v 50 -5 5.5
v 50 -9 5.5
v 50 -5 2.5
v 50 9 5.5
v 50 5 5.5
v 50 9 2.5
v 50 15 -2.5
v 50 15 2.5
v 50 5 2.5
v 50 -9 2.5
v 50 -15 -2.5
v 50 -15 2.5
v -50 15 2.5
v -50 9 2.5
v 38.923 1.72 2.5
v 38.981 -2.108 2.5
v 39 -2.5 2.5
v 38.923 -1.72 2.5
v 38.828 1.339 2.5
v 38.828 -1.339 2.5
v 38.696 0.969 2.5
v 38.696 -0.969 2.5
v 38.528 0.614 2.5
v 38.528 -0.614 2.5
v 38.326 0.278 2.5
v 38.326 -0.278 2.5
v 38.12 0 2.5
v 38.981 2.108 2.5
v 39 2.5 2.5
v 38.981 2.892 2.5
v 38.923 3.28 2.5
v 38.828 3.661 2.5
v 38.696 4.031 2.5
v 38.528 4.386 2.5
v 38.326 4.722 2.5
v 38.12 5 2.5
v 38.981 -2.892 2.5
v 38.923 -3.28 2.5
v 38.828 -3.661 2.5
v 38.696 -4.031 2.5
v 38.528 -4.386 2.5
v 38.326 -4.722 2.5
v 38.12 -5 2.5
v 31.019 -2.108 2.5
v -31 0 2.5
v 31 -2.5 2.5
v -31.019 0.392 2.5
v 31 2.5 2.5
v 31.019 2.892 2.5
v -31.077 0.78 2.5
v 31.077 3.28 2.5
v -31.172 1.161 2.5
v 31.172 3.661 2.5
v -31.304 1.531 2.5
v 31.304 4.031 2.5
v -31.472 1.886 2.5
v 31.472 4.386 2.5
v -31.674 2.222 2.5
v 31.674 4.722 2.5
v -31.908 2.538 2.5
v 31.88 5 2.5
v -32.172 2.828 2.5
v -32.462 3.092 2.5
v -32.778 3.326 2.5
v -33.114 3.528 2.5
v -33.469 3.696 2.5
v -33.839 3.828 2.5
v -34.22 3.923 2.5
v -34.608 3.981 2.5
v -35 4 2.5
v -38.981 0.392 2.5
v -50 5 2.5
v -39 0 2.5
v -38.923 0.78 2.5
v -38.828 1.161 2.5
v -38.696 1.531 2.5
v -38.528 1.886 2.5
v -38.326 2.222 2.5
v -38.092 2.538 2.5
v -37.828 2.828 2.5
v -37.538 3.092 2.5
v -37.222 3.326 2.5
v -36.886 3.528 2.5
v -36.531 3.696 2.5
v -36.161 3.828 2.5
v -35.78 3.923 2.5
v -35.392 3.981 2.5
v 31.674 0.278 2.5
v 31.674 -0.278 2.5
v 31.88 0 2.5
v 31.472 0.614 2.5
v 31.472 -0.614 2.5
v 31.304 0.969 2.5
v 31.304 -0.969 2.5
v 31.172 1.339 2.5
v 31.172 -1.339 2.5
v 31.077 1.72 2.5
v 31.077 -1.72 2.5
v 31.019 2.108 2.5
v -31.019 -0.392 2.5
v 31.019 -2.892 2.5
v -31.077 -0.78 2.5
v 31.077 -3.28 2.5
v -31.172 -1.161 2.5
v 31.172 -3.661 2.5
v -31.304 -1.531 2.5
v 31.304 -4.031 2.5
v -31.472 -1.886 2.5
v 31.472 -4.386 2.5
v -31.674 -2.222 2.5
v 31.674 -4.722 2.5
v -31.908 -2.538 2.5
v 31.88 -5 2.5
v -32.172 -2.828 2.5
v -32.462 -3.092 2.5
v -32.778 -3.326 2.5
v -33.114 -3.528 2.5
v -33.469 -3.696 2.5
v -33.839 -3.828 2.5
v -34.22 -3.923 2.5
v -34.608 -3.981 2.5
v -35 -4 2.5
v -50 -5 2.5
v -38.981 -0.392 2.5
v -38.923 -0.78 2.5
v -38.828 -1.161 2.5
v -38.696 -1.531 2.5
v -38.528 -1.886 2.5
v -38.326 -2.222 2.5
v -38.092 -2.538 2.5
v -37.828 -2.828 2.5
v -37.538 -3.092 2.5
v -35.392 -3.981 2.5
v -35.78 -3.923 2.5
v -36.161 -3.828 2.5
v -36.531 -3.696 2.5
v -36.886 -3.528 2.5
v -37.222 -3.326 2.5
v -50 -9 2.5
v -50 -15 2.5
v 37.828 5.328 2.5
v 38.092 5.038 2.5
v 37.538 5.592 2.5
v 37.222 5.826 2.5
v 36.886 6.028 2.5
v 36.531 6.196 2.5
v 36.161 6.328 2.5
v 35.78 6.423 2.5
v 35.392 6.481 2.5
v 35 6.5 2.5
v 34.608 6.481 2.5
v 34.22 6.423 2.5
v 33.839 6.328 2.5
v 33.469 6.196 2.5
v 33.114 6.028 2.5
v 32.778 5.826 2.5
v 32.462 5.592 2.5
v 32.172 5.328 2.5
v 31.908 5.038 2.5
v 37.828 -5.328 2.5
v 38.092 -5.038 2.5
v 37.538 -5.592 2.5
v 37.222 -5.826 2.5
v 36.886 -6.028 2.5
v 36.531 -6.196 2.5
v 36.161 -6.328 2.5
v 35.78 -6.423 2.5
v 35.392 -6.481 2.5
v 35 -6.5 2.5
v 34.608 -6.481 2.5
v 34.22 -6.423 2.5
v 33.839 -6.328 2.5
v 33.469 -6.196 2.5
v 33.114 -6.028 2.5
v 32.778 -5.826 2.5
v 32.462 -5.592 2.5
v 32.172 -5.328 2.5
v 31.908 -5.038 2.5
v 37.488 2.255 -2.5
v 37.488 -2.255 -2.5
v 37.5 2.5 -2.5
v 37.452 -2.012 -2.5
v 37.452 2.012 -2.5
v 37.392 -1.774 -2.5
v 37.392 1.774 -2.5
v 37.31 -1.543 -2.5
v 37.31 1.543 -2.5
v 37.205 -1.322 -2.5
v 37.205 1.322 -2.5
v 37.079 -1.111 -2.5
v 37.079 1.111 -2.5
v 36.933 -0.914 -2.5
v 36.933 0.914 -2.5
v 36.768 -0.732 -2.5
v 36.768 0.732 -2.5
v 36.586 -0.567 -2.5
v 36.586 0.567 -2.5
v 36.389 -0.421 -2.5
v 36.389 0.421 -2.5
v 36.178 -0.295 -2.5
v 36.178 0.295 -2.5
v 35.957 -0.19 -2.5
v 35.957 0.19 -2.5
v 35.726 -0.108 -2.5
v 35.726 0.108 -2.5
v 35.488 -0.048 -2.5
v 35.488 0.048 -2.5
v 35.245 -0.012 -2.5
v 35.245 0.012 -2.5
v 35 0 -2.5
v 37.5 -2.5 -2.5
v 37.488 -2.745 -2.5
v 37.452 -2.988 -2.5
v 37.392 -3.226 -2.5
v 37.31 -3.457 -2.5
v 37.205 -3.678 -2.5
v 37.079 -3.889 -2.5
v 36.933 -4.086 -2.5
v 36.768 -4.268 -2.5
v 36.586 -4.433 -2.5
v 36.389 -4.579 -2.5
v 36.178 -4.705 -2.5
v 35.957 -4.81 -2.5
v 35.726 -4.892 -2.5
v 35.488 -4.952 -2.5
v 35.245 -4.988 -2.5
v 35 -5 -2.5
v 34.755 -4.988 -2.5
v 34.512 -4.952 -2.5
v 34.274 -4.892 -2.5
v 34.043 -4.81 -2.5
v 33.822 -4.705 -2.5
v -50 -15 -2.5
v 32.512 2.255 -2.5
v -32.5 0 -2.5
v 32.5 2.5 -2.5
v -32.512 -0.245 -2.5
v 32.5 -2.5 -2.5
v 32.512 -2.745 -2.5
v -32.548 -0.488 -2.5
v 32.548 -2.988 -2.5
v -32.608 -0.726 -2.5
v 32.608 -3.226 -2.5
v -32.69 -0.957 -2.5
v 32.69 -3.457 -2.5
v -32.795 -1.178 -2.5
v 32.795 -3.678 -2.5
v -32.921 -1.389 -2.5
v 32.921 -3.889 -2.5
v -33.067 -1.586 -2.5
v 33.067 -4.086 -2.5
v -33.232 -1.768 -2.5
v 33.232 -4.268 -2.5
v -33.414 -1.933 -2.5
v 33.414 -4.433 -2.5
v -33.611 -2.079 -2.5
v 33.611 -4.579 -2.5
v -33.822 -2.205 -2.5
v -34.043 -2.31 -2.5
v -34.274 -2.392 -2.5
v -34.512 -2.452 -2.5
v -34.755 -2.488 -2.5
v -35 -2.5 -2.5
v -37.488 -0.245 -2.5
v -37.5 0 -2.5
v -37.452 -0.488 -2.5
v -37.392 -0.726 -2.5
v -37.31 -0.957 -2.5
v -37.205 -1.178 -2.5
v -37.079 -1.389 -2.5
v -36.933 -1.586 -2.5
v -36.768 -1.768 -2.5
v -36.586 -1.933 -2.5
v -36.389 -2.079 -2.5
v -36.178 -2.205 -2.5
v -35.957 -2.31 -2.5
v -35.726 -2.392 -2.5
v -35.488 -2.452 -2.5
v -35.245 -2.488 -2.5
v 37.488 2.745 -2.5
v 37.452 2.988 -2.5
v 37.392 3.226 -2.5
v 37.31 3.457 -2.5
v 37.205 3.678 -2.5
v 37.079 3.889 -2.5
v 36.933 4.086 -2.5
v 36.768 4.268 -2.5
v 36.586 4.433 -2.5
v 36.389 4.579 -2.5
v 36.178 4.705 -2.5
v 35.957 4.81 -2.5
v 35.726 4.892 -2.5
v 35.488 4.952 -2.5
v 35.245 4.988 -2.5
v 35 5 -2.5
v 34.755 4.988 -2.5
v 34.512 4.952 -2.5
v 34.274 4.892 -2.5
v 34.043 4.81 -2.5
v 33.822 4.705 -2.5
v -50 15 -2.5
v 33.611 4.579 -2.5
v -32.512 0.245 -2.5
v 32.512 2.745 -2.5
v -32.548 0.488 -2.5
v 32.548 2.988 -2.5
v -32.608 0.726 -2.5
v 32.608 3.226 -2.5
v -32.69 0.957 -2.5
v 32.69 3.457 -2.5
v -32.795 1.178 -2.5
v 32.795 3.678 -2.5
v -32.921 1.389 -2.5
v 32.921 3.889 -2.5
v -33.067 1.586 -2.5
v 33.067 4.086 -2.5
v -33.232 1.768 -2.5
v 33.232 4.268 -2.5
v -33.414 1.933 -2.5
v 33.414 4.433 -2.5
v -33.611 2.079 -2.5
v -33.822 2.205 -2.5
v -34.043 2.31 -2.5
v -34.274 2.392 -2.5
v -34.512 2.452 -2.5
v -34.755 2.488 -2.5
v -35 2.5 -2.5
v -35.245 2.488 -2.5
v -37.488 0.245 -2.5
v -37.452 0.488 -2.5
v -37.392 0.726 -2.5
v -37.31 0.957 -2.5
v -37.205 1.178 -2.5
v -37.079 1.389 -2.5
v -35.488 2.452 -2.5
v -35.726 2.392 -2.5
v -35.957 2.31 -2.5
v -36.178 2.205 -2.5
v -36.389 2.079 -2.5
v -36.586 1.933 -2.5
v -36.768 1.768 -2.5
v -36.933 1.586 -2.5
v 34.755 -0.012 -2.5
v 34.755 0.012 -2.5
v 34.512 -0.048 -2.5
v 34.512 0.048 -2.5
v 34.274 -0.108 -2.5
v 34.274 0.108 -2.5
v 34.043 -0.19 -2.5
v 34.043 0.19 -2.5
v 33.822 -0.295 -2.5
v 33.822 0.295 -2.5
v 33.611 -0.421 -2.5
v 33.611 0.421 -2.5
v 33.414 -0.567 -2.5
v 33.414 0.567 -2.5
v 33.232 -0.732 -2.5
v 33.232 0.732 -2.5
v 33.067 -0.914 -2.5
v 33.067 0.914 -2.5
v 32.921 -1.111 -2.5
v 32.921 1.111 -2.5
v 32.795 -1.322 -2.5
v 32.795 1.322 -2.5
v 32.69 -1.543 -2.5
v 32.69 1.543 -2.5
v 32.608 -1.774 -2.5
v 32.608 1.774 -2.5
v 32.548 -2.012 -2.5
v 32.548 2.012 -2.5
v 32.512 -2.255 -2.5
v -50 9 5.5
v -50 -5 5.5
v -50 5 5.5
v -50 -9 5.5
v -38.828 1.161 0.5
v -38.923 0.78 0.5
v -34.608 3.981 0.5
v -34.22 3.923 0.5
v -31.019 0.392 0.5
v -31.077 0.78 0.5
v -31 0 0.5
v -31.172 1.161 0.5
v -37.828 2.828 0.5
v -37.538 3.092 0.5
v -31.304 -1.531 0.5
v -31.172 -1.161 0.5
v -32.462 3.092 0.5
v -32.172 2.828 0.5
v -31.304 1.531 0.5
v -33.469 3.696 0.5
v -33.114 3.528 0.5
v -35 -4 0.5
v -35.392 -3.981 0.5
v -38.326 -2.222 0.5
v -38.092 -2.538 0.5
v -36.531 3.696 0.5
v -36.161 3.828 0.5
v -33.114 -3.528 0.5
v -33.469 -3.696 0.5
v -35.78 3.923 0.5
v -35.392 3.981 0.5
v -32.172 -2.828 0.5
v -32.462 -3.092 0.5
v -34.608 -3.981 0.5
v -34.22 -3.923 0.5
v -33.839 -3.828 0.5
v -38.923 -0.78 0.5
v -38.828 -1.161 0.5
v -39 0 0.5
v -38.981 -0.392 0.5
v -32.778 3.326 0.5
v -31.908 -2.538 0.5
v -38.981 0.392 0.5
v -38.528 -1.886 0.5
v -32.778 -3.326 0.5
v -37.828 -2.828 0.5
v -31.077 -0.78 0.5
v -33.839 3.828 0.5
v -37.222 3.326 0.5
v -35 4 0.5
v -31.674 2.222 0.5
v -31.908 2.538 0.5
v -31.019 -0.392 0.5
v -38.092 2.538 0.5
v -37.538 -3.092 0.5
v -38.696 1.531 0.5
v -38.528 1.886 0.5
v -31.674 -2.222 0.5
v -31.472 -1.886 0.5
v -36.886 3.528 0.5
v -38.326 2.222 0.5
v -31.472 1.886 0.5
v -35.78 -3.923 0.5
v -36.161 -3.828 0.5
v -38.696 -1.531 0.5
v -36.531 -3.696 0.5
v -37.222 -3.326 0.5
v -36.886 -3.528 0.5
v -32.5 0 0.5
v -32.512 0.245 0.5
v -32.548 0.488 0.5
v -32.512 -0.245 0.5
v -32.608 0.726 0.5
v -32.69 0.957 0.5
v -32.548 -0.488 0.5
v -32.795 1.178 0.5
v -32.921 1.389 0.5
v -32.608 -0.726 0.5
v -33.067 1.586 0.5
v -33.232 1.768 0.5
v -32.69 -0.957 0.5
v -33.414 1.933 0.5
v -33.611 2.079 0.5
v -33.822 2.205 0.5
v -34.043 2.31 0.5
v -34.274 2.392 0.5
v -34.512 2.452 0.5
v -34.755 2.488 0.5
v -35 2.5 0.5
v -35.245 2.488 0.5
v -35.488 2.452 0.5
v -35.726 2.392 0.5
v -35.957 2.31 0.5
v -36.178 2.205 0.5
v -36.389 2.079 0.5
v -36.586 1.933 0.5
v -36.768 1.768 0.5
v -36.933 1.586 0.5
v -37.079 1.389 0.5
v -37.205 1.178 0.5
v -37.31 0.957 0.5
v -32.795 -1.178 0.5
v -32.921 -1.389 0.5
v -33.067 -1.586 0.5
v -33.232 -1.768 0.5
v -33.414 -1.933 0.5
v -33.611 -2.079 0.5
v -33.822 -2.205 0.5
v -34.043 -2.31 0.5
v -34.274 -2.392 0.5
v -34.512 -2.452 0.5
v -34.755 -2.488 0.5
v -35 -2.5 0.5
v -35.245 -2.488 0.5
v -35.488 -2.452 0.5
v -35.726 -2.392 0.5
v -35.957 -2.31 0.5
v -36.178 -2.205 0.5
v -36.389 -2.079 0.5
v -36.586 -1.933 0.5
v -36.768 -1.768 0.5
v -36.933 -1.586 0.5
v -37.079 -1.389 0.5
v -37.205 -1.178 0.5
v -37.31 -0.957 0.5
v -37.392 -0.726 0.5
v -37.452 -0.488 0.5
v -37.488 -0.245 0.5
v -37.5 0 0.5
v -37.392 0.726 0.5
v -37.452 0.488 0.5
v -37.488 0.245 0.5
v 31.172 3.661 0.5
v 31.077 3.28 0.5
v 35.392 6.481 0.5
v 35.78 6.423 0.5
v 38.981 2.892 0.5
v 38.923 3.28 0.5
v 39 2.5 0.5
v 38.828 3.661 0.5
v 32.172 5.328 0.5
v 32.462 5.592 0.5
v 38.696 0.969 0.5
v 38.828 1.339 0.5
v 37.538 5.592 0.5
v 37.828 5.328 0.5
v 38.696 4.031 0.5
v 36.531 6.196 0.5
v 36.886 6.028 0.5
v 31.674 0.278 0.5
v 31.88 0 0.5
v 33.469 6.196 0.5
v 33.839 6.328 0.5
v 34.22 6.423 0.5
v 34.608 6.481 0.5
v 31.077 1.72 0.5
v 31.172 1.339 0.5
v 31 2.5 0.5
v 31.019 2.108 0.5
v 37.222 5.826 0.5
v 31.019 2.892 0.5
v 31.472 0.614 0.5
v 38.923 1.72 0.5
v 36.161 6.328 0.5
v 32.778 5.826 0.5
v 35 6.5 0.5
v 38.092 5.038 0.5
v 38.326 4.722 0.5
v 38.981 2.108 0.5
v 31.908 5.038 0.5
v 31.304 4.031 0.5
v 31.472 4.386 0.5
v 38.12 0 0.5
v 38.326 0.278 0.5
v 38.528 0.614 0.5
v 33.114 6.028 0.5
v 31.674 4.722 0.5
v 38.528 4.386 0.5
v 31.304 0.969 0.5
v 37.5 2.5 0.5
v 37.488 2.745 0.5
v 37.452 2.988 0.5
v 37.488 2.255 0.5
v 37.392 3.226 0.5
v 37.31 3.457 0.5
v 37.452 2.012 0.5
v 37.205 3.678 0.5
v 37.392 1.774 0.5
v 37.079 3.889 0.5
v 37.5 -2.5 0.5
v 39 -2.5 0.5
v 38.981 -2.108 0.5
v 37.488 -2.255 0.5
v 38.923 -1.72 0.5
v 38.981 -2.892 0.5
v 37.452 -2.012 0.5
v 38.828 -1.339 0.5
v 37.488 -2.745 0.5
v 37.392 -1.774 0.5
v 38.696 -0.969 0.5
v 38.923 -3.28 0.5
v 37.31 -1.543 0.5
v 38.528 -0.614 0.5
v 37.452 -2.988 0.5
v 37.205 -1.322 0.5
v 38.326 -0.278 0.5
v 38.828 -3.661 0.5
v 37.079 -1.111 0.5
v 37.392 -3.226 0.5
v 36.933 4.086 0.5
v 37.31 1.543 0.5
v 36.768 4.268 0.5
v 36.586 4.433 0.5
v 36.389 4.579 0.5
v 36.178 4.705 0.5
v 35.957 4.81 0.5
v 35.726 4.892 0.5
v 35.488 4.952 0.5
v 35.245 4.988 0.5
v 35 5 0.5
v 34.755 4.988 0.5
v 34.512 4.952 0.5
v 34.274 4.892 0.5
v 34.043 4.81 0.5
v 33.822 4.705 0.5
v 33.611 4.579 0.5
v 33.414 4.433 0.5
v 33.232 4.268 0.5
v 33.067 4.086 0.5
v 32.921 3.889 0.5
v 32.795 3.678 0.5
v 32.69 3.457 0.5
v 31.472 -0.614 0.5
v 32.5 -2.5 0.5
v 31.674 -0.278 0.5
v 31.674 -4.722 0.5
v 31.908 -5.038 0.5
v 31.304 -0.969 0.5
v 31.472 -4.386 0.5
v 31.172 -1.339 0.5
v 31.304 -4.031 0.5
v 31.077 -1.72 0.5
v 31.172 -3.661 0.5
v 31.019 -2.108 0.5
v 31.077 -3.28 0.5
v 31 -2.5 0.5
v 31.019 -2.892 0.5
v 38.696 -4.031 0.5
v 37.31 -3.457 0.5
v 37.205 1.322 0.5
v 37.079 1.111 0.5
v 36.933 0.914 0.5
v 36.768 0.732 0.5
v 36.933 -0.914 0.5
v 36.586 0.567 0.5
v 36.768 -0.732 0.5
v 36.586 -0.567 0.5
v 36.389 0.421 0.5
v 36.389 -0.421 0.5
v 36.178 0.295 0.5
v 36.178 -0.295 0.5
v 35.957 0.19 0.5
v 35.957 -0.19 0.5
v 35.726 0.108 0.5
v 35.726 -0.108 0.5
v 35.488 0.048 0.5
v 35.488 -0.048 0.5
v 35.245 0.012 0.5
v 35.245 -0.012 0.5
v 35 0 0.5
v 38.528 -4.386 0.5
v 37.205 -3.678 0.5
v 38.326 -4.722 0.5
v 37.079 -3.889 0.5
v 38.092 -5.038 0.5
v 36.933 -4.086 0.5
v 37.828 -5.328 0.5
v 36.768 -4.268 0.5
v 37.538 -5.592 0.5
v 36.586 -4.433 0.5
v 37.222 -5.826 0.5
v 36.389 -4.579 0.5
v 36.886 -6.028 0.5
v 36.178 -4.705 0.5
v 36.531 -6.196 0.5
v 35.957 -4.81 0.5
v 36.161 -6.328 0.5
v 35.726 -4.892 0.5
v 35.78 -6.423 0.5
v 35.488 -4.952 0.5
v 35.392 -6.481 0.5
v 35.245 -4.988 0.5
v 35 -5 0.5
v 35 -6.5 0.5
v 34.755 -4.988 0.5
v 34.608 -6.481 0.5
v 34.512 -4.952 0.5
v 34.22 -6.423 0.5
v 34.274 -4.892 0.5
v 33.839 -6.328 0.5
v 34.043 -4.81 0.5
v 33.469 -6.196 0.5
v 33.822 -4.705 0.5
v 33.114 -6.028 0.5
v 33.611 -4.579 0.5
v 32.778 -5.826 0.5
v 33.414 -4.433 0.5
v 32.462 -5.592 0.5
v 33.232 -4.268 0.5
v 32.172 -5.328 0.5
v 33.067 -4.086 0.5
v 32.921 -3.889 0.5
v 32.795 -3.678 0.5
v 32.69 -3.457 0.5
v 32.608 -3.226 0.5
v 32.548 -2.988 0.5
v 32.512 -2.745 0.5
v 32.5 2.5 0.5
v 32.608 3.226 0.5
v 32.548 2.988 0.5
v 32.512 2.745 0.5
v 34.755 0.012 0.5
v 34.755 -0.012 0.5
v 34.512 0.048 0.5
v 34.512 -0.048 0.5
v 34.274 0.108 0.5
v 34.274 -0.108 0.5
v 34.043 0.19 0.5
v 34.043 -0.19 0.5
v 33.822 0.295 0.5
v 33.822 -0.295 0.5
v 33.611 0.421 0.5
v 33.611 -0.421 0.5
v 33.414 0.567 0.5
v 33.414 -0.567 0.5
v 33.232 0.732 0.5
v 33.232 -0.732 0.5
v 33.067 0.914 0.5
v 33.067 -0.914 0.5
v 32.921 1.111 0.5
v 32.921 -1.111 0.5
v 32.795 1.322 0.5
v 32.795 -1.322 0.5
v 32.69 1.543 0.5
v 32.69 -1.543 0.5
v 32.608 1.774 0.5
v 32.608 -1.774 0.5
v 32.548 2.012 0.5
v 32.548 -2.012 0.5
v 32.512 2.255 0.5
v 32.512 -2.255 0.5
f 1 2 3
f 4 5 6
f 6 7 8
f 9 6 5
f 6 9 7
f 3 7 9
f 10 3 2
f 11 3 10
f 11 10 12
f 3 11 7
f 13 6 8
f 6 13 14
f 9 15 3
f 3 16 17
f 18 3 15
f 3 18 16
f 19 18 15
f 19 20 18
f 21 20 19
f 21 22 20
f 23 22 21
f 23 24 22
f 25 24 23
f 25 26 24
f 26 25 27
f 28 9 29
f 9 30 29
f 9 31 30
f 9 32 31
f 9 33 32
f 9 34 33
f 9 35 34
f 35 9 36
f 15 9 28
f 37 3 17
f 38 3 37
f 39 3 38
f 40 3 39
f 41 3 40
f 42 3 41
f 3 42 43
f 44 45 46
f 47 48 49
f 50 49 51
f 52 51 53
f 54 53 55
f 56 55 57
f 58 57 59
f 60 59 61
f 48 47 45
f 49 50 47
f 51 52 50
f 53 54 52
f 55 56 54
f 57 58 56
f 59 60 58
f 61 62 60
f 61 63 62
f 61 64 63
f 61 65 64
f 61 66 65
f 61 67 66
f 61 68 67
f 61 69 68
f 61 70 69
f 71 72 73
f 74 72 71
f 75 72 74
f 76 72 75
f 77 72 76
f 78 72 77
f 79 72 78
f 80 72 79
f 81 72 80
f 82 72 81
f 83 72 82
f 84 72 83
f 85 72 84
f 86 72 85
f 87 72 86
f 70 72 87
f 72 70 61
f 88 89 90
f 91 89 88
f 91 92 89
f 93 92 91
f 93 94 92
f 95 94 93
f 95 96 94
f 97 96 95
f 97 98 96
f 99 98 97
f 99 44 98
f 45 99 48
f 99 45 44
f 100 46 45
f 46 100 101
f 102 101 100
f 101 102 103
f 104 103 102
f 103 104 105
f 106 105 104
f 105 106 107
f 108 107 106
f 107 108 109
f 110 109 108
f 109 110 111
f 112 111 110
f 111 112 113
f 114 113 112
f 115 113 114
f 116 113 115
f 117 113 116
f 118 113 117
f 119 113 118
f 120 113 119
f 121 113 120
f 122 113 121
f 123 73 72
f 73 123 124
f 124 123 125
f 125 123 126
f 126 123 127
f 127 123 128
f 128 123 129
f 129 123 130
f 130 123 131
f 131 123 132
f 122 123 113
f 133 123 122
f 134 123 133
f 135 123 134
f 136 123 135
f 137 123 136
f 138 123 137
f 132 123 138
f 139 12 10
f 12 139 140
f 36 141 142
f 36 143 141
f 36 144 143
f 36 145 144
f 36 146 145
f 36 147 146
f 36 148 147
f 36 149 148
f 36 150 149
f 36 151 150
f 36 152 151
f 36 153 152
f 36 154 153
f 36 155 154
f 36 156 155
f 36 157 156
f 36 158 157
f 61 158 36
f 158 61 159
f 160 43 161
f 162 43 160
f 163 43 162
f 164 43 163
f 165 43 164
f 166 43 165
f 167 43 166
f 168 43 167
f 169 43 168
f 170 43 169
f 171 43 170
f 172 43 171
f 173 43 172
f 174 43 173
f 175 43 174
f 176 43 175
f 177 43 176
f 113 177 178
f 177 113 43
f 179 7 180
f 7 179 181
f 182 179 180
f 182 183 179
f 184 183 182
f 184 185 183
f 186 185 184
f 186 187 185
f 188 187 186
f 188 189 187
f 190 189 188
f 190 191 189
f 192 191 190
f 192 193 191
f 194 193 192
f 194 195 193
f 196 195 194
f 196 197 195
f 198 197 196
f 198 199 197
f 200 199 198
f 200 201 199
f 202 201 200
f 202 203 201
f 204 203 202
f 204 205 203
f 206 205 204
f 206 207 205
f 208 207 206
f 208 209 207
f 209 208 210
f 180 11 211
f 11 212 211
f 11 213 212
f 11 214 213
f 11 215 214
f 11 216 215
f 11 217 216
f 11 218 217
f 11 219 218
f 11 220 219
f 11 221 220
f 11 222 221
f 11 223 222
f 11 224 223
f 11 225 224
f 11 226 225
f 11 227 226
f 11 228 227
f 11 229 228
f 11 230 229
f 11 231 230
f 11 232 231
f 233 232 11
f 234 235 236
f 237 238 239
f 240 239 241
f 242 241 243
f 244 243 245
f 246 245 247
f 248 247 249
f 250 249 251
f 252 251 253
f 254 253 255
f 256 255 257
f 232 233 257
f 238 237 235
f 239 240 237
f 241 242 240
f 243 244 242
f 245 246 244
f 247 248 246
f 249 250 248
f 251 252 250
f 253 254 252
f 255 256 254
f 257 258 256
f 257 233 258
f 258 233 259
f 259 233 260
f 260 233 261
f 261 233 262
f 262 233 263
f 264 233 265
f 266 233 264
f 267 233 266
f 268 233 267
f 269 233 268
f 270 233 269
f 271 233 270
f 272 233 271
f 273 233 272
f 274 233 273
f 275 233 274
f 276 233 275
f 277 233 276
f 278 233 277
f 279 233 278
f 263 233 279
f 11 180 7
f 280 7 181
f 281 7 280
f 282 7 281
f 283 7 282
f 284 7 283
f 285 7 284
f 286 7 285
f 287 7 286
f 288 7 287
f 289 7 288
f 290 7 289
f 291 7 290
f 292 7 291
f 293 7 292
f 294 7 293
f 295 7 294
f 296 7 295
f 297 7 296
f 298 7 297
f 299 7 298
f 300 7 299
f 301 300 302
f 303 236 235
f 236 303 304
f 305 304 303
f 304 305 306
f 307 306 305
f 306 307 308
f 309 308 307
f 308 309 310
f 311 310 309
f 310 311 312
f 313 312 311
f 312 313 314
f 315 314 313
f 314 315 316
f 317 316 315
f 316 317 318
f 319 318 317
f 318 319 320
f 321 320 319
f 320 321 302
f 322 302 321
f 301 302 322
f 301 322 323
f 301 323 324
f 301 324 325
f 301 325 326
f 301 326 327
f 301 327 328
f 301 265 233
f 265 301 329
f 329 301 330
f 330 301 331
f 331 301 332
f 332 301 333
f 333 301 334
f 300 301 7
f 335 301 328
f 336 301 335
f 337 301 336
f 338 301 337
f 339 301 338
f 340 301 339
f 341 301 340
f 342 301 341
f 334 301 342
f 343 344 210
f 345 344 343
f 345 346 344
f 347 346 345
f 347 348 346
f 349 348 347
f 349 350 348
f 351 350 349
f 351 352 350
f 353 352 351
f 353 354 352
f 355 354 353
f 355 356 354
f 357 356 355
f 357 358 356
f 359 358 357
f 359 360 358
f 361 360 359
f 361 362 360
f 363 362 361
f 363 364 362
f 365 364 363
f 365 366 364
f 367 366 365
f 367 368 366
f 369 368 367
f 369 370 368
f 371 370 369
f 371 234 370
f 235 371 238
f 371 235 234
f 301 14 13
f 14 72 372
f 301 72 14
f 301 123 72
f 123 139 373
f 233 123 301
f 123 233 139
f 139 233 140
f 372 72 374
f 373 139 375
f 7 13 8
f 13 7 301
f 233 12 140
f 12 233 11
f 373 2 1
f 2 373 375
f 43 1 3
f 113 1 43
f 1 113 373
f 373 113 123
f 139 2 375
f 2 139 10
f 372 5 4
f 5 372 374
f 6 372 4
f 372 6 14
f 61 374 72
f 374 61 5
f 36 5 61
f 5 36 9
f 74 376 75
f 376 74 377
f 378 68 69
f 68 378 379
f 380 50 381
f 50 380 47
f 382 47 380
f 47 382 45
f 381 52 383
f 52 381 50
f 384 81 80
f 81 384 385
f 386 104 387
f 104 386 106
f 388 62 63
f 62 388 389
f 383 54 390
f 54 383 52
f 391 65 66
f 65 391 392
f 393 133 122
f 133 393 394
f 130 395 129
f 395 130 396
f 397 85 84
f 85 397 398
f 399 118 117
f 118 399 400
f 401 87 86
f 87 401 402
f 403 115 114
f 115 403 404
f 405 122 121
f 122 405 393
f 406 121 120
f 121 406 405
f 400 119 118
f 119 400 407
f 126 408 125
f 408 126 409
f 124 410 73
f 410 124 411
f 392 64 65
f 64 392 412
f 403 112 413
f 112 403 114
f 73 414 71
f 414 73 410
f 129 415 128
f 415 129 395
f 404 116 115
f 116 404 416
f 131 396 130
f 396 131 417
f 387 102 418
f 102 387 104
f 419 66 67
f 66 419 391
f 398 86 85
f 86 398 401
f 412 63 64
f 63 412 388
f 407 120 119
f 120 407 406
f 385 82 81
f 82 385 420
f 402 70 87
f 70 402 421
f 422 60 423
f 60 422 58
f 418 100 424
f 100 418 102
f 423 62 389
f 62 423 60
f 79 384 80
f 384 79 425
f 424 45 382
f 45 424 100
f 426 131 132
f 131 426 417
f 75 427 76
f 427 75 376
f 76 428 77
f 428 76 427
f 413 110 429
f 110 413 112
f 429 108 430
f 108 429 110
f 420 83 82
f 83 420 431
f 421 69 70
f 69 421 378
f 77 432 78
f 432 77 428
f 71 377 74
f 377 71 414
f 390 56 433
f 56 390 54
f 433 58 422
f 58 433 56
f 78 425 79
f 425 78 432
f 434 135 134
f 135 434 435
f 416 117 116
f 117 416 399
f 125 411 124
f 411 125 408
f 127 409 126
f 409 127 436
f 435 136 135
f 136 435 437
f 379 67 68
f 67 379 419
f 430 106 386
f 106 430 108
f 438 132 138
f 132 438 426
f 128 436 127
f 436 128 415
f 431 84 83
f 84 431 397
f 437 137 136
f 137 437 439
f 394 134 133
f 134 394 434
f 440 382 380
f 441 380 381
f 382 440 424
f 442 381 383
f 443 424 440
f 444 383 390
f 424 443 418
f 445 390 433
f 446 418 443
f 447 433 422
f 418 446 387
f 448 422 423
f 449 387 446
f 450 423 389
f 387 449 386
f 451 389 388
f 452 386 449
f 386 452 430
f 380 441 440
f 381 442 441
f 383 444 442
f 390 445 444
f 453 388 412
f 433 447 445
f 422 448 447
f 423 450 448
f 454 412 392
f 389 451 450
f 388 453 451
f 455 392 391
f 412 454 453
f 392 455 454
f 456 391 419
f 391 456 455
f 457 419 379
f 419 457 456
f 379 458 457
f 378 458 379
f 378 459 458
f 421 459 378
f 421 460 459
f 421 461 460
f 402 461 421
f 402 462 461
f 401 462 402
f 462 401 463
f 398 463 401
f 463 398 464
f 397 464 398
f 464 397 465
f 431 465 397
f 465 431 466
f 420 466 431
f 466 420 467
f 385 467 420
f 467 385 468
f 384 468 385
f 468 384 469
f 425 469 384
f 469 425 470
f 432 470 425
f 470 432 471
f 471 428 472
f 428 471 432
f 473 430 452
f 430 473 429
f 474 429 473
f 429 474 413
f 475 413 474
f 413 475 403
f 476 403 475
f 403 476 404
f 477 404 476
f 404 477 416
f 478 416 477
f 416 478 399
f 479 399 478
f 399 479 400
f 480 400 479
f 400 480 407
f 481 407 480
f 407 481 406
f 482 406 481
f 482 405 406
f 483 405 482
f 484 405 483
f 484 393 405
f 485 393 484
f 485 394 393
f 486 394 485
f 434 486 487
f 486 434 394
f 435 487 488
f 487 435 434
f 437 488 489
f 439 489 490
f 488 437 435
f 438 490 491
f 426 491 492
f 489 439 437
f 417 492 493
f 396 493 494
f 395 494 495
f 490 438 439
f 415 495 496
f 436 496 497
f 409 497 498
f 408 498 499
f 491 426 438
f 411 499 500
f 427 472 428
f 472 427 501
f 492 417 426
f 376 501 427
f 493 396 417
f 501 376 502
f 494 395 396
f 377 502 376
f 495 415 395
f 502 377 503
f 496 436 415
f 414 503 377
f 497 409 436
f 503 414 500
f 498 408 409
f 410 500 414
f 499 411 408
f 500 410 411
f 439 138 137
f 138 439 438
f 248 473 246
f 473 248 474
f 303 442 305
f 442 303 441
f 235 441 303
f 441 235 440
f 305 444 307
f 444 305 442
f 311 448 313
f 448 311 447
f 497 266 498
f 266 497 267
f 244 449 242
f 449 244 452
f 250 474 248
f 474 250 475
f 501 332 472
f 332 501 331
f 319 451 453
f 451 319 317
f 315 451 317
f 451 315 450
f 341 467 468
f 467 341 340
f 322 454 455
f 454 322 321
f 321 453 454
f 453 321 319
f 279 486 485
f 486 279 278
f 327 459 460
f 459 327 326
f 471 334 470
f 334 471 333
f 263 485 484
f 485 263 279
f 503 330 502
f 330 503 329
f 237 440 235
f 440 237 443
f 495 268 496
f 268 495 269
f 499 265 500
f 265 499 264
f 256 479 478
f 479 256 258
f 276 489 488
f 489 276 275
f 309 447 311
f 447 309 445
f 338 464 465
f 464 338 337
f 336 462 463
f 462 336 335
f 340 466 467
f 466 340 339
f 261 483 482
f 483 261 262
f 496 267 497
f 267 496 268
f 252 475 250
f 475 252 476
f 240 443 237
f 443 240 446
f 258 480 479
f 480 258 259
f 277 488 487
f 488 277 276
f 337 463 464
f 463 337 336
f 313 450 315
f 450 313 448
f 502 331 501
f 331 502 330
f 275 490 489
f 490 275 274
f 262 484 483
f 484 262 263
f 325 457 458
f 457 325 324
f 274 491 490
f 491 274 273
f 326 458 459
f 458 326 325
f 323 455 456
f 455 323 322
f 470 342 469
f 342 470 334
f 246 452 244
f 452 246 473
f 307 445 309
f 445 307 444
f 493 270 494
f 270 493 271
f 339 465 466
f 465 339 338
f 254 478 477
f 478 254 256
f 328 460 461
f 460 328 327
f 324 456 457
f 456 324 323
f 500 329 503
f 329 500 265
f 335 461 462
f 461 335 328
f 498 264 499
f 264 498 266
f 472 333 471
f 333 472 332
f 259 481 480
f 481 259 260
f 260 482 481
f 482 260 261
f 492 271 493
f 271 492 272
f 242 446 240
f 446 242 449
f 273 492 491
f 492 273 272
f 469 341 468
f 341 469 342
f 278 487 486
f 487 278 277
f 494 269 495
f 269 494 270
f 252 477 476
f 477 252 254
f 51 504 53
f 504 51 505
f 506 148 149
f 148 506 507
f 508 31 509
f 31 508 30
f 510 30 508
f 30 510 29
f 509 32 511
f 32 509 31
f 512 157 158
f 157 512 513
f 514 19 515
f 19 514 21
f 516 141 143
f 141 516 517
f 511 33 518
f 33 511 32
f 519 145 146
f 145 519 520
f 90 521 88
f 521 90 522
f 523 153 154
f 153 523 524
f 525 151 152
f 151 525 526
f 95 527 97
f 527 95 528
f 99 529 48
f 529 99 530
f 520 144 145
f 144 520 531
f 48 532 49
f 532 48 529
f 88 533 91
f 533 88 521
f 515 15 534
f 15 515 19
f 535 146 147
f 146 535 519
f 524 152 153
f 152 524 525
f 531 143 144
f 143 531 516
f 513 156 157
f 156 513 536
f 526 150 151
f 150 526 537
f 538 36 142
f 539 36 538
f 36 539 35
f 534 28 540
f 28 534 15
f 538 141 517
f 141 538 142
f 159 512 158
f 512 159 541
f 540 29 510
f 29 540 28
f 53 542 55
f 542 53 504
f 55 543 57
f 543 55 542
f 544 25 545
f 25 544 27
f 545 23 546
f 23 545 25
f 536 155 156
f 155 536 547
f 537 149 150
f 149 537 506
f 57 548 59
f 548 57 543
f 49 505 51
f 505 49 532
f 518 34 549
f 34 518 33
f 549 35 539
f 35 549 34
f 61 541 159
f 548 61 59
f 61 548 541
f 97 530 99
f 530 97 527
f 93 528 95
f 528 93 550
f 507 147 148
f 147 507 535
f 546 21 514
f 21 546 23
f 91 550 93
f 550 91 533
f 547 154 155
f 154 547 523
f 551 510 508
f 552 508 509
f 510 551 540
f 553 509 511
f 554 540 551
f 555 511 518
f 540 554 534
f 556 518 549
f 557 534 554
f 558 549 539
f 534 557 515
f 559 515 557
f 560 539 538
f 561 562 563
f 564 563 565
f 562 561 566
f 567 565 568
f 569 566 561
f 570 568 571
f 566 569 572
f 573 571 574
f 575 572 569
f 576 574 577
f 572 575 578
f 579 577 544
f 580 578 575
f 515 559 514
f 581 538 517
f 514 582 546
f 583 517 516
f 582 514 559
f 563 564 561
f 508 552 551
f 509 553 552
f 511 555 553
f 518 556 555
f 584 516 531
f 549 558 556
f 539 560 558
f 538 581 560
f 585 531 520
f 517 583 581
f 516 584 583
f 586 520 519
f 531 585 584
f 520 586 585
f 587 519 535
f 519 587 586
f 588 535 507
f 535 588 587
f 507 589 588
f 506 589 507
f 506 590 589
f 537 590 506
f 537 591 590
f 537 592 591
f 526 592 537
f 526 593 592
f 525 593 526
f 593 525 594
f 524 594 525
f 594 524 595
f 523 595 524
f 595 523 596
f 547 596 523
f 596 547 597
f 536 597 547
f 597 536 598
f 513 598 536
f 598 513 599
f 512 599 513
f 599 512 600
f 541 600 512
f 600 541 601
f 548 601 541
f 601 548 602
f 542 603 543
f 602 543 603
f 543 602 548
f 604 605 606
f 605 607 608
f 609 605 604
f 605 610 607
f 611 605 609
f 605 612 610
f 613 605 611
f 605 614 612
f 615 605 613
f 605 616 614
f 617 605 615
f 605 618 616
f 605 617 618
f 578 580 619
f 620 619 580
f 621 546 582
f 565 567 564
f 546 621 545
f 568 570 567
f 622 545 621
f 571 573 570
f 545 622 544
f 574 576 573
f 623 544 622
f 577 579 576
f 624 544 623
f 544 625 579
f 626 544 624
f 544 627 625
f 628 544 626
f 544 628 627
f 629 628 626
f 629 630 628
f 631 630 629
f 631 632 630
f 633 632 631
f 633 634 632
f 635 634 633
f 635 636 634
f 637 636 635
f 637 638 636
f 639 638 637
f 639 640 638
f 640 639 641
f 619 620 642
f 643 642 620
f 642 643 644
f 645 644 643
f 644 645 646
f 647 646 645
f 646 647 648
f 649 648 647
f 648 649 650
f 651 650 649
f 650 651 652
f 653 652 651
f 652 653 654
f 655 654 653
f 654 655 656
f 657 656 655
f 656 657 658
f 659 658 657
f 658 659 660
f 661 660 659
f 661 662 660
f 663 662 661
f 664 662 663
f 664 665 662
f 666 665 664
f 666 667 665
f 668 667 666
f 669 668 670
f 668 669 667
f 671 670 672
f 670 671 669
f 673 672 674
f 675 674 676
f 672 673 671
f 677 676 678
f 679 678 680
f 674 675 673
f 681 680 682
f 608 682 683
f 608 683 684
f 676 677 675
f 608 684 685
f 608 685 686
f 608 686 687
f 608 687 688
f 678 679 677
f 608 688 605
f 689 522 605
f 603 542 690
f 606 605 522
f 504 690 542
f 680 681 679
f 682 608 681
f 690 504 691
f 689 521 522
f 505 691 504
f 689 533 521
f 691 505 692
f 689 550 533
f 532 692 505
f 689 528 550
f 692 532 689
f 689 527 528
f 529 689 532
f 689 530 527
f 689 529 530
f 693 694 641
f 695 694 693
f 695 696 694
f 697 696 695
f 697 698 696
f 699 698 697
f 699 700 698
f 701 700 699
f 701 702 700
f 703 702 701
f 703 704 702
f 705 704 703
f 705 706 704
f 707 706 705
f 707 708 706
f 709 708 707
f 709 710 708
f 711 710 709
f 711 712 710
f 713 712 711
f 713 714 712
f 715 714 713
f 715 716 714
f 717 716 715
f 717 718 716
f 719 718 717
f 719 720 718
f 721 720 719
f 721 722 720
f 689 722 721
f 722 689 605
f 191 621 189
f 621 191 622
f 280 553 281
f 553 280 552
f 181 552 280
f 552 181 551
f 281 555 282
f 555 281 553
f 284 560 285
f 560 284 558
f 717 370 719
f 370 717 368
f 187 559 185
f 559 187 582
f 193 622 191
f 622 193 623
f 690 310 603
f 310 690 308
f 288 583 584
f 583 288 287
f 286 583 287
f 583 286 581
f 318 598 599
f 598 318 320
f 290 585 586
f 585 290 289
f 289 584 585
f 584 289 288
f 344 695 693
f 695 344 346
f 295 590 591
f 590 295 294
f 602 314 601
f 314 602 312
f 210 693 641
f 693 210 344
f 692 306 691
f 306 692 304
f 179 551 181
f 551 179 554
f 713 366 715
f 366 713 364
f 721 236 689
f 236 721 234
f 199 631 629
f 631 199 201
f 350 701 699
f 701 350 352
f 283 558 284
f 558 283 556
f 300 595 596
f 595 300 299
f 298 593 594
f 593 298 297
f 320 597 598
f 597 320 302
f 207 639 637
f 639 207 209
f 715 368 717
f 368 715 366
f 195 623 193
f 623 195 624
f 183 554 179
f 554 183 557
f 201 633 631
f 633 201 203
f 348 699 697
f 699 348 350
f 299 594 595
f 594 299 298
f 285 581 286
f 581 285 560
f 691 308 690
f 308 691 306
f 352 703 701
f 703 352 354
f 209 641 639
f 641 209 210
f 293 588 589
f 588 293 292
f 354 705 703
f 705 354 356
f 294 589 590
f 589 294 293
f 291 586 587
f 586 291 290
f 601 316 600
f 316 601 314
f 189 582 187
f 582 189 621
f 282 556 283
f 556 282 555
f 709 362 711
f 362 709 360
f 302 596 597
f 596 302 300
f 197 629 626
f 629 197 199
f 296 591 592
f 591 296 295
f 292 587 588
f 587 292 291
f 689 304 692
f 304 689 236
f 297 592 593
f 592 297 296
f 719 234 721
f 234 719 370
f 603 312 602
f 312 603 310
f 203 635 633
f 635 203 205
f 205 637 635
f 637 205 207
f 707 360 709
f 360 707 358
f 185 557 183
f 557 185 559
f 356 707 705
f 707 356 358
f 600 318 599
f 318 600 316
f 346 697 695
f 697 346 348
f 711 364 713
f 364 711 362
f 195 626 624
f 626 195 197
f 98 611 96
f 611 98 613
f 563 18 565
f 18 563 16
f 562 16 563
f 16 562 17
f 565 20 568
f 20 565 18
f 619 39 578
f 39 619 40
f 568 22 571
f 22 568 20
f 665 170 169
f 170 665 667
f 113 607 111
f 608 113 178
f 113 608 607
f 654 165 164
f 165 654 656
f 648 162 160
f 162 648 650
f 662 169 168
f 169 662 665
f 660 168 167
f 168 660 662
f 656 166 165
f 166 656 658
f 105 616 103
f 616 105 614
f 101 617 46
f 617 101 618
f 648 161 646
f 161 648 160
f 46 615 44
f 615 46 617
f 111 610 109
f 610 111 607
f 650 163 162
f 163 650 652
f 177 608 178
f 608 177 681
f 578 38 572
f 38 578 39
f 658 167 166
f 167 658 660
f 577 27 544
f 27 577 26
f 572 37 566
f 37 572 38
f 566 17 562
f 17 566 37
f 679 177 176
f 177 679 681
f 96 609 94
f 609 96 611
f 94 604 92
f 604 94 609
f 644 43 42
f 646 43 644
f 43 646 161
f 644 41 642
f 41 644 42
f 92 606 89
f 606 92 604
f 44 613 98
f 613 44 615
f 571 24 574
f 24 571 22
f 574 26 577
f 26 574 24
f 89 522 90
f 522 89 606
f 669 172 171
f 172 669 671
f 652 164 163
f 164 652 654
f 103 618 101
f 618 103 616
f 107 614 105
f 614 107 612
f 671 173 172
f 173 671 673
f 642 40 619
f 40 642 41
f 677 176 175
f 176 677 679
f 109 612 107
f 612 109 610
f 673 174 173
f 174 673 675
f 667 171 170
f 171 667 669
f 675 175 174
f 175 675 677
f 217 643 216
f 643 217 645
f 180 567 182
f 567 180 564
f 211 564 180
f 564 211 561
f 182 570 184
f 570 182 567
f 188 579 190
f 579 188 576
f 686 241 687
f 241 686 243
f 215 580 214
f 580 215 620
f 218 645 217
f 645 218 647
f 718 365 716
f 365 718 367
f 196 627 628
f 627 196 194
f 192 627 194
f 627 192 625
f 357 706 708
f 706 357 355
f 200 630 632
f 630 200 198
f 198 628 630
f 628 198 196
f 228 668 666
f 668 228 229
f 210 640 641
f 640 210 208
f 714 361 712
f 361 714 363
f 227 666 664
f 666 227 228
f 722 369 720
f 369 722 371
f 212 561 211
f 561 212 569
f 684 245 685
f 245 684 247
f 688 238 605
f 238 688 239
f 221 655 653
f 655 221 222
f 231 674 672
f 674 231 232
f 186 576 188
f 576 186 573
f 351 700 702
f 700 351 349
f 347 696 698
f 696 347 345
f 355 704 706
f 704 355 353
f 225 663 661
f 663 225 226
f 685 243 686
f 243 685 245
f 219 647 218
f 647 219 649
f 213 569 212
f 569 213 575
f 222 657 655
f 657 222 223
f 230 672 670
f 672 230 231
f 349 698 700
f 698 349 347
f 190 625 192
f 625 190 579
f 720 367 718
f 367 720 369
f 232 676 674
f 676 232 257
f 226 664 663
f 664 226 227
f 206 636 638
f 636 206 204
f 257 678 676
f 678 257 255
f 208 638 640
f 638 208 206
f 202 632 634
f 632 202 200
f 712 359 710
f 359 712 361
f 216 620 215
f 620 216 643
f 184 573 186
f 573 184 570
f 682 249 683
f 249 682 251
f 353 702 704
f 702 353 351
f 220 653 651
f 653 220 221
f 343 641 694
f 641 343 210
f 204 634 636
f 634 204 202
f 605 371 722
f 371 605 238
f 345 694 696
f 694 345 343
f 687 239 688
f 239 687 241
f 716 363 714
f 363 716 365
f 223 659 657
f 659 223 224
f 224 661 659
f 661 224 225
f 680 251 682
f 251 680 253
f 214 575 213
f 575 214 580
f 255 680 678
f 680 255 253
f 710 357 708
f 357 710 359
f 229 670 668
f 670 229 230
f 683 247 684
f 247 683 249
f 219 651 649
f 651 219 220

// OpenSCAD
// Parametric Rectangular Base with Lengthwise Ribs and Stepped Holes
// All dimensions in mm

// ---- Base Plate ----
base_length = 100;
base_width  = 30;
base_thick  = 5;

// ---- Lengthwise Ribs ----
rib_width   = 4;           // thickness of each rib
rib_height  = 3;           // height above top face of base
rib_spacing = 14;          // center-to-center distance of the two ribs
rib_y_pos   = rib_spacing / 2; // offset from centerline for each rib

// ---- Hole Layout (stepped: shallow counterbore + through hole) ----
// Hole positions relative to center of base
hole_left_x   = -35;
hole_left_y   = 0;
hole_right_x  = 35;
hole_right_y  = 2.5;       // stays clear of ribs

// ---- Stepped Hole Dimensions ----
outer_dia    = 8;          // diameter of shallow recess
outer_depth  = 2;          // depth of recess from top surface
inner_dia    = 5;          // diameter of through hole

// Resolution
$fn = 64;

// ---- Module: Stepped Hole (cut from top surface downward) ----
// Places outer recess and inner through hole, both centered on XY, with top at z=0.
// total_depth must equal base_thick.
module stepped_hole() {
    union() {
        // shallow counterbore: outer_depth tall, starts at top
        translate([0, 0, -outer_depth/2])
            cylinder(h = outer_depth, d = outer_dia, center = true);
        // through hole: full base thickness, centered at mid-depth
        translate([0, 0, -base_thick/2])
            cylinder(h = base_thick, d = inner_dia, center = true);
    }
}

// ---- Main Model ----
difference() {
    // Solid part: base plate plus two ribs on top
    union() {
        // Base plate centered at origin, top at z = +base_thick/2
        cube([base_length, base_width, base_thick], center = true);

        // Left rib (when viewed from above, running the full length)
        translate([0, -rib_y_pos, base_thick/2 + rib_height/2])
            cube([base_length, rib_width, rib_height], center = true);

        // Right rib
        translate([0,  rib_y_pos, base_thick/2 + rib_height/2])
            cube([base_length, rib_width, rib_height], center = true);
    }

    // Cutouts: stepped holes at designated locations, referenced from top surface
    // Left hole
    translate([hole_left_x, hole_left_y, base_thick/2])
        stepped_hole();

    // Two right holes
    translate([hole_right_x,  hole_right_y, base_thick/2])
        stepped_hole();
    translate([hole_right_x, -hole_right_y, base_thick/2])
        stepped_hole();
}
